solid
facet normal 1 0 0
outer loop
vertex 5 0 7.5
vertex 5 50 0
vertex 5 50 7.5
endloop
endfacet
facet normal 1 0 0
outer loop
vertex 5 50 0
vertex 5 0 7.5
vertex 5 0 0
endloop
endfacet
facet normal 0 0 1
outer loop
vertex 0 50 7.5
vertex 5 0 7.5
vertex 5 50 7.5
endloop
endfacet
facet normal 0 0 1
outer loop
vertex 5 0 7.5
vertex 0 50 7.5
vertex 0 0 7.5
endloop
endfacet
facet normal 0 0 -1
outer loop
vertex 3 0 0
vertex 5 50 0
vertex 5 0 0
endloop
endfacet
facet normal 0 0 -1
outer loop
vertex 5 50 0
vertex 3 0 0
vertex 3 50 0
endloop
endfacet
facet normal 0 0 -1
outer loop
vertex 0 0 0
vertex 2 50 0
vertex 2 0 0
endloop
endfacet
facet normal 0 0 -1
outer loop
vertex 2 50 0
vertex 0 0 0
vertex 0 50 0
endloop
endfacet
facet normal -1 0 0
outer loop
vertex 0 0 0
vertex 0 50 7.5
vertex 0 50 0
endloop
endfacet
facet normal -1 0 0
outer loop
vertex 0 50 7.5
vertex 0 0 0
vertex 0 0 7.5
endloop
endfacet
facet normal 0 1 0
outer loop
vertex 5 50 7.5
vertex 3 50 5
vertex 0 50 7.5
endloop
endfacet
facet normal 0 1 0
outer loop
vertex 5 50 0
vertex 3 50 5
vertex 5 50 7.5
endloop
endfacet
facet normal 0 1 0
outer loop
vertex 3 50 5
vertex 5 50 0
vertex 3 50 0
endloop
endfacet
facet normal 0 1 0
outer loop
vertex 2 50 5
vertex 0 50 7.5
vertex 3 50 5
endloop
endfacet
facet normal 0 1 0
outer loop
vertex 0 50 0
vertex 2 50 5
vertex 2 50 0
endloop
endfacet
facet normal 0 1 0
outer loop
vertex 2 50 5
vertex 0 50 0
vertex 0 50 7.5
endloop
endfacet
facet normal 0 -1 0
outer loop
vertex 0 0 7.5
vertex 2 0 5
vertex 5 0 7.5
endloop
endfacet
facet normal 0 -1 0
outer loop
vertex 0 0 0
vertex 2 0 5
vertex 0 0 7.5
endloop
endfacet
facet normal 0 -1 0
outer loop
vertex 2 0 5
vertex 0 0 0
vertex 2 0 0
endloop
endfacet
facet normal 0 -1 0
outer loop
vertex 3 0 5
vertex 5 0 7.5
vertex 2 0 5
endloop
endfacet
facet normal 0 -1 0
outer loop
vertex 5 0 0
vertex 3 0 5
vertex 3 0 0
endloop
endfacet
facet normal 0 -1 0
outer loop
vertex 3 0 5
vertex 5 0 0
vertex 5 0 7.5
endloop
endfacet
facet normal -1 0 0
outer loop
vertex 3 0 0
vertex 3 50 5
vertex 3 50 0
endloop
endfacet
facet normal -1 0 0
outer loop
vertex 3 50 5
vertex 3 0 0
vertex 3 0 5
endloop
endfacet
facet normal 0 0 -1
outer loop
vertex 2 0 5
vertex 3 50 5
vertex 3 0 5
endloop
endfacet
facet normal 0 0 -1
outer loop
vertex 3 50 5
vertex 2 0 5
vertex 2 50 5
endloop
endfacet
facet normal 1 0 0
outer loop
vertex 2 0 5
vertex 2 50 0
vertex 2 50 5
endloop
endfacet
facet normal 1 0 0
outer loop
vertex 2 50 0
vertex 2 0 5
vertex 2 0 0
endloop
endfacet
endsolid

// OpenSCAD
l = 50;
w_tot = 5;
h_tot = 7.5;
h_grove = 5;
ww = 2;
wg = 1;

difference() {
cube([w_tot, l, h_tot]);
translate([ww, 0, 0]) cube([wg, l, h_grove]);
}
